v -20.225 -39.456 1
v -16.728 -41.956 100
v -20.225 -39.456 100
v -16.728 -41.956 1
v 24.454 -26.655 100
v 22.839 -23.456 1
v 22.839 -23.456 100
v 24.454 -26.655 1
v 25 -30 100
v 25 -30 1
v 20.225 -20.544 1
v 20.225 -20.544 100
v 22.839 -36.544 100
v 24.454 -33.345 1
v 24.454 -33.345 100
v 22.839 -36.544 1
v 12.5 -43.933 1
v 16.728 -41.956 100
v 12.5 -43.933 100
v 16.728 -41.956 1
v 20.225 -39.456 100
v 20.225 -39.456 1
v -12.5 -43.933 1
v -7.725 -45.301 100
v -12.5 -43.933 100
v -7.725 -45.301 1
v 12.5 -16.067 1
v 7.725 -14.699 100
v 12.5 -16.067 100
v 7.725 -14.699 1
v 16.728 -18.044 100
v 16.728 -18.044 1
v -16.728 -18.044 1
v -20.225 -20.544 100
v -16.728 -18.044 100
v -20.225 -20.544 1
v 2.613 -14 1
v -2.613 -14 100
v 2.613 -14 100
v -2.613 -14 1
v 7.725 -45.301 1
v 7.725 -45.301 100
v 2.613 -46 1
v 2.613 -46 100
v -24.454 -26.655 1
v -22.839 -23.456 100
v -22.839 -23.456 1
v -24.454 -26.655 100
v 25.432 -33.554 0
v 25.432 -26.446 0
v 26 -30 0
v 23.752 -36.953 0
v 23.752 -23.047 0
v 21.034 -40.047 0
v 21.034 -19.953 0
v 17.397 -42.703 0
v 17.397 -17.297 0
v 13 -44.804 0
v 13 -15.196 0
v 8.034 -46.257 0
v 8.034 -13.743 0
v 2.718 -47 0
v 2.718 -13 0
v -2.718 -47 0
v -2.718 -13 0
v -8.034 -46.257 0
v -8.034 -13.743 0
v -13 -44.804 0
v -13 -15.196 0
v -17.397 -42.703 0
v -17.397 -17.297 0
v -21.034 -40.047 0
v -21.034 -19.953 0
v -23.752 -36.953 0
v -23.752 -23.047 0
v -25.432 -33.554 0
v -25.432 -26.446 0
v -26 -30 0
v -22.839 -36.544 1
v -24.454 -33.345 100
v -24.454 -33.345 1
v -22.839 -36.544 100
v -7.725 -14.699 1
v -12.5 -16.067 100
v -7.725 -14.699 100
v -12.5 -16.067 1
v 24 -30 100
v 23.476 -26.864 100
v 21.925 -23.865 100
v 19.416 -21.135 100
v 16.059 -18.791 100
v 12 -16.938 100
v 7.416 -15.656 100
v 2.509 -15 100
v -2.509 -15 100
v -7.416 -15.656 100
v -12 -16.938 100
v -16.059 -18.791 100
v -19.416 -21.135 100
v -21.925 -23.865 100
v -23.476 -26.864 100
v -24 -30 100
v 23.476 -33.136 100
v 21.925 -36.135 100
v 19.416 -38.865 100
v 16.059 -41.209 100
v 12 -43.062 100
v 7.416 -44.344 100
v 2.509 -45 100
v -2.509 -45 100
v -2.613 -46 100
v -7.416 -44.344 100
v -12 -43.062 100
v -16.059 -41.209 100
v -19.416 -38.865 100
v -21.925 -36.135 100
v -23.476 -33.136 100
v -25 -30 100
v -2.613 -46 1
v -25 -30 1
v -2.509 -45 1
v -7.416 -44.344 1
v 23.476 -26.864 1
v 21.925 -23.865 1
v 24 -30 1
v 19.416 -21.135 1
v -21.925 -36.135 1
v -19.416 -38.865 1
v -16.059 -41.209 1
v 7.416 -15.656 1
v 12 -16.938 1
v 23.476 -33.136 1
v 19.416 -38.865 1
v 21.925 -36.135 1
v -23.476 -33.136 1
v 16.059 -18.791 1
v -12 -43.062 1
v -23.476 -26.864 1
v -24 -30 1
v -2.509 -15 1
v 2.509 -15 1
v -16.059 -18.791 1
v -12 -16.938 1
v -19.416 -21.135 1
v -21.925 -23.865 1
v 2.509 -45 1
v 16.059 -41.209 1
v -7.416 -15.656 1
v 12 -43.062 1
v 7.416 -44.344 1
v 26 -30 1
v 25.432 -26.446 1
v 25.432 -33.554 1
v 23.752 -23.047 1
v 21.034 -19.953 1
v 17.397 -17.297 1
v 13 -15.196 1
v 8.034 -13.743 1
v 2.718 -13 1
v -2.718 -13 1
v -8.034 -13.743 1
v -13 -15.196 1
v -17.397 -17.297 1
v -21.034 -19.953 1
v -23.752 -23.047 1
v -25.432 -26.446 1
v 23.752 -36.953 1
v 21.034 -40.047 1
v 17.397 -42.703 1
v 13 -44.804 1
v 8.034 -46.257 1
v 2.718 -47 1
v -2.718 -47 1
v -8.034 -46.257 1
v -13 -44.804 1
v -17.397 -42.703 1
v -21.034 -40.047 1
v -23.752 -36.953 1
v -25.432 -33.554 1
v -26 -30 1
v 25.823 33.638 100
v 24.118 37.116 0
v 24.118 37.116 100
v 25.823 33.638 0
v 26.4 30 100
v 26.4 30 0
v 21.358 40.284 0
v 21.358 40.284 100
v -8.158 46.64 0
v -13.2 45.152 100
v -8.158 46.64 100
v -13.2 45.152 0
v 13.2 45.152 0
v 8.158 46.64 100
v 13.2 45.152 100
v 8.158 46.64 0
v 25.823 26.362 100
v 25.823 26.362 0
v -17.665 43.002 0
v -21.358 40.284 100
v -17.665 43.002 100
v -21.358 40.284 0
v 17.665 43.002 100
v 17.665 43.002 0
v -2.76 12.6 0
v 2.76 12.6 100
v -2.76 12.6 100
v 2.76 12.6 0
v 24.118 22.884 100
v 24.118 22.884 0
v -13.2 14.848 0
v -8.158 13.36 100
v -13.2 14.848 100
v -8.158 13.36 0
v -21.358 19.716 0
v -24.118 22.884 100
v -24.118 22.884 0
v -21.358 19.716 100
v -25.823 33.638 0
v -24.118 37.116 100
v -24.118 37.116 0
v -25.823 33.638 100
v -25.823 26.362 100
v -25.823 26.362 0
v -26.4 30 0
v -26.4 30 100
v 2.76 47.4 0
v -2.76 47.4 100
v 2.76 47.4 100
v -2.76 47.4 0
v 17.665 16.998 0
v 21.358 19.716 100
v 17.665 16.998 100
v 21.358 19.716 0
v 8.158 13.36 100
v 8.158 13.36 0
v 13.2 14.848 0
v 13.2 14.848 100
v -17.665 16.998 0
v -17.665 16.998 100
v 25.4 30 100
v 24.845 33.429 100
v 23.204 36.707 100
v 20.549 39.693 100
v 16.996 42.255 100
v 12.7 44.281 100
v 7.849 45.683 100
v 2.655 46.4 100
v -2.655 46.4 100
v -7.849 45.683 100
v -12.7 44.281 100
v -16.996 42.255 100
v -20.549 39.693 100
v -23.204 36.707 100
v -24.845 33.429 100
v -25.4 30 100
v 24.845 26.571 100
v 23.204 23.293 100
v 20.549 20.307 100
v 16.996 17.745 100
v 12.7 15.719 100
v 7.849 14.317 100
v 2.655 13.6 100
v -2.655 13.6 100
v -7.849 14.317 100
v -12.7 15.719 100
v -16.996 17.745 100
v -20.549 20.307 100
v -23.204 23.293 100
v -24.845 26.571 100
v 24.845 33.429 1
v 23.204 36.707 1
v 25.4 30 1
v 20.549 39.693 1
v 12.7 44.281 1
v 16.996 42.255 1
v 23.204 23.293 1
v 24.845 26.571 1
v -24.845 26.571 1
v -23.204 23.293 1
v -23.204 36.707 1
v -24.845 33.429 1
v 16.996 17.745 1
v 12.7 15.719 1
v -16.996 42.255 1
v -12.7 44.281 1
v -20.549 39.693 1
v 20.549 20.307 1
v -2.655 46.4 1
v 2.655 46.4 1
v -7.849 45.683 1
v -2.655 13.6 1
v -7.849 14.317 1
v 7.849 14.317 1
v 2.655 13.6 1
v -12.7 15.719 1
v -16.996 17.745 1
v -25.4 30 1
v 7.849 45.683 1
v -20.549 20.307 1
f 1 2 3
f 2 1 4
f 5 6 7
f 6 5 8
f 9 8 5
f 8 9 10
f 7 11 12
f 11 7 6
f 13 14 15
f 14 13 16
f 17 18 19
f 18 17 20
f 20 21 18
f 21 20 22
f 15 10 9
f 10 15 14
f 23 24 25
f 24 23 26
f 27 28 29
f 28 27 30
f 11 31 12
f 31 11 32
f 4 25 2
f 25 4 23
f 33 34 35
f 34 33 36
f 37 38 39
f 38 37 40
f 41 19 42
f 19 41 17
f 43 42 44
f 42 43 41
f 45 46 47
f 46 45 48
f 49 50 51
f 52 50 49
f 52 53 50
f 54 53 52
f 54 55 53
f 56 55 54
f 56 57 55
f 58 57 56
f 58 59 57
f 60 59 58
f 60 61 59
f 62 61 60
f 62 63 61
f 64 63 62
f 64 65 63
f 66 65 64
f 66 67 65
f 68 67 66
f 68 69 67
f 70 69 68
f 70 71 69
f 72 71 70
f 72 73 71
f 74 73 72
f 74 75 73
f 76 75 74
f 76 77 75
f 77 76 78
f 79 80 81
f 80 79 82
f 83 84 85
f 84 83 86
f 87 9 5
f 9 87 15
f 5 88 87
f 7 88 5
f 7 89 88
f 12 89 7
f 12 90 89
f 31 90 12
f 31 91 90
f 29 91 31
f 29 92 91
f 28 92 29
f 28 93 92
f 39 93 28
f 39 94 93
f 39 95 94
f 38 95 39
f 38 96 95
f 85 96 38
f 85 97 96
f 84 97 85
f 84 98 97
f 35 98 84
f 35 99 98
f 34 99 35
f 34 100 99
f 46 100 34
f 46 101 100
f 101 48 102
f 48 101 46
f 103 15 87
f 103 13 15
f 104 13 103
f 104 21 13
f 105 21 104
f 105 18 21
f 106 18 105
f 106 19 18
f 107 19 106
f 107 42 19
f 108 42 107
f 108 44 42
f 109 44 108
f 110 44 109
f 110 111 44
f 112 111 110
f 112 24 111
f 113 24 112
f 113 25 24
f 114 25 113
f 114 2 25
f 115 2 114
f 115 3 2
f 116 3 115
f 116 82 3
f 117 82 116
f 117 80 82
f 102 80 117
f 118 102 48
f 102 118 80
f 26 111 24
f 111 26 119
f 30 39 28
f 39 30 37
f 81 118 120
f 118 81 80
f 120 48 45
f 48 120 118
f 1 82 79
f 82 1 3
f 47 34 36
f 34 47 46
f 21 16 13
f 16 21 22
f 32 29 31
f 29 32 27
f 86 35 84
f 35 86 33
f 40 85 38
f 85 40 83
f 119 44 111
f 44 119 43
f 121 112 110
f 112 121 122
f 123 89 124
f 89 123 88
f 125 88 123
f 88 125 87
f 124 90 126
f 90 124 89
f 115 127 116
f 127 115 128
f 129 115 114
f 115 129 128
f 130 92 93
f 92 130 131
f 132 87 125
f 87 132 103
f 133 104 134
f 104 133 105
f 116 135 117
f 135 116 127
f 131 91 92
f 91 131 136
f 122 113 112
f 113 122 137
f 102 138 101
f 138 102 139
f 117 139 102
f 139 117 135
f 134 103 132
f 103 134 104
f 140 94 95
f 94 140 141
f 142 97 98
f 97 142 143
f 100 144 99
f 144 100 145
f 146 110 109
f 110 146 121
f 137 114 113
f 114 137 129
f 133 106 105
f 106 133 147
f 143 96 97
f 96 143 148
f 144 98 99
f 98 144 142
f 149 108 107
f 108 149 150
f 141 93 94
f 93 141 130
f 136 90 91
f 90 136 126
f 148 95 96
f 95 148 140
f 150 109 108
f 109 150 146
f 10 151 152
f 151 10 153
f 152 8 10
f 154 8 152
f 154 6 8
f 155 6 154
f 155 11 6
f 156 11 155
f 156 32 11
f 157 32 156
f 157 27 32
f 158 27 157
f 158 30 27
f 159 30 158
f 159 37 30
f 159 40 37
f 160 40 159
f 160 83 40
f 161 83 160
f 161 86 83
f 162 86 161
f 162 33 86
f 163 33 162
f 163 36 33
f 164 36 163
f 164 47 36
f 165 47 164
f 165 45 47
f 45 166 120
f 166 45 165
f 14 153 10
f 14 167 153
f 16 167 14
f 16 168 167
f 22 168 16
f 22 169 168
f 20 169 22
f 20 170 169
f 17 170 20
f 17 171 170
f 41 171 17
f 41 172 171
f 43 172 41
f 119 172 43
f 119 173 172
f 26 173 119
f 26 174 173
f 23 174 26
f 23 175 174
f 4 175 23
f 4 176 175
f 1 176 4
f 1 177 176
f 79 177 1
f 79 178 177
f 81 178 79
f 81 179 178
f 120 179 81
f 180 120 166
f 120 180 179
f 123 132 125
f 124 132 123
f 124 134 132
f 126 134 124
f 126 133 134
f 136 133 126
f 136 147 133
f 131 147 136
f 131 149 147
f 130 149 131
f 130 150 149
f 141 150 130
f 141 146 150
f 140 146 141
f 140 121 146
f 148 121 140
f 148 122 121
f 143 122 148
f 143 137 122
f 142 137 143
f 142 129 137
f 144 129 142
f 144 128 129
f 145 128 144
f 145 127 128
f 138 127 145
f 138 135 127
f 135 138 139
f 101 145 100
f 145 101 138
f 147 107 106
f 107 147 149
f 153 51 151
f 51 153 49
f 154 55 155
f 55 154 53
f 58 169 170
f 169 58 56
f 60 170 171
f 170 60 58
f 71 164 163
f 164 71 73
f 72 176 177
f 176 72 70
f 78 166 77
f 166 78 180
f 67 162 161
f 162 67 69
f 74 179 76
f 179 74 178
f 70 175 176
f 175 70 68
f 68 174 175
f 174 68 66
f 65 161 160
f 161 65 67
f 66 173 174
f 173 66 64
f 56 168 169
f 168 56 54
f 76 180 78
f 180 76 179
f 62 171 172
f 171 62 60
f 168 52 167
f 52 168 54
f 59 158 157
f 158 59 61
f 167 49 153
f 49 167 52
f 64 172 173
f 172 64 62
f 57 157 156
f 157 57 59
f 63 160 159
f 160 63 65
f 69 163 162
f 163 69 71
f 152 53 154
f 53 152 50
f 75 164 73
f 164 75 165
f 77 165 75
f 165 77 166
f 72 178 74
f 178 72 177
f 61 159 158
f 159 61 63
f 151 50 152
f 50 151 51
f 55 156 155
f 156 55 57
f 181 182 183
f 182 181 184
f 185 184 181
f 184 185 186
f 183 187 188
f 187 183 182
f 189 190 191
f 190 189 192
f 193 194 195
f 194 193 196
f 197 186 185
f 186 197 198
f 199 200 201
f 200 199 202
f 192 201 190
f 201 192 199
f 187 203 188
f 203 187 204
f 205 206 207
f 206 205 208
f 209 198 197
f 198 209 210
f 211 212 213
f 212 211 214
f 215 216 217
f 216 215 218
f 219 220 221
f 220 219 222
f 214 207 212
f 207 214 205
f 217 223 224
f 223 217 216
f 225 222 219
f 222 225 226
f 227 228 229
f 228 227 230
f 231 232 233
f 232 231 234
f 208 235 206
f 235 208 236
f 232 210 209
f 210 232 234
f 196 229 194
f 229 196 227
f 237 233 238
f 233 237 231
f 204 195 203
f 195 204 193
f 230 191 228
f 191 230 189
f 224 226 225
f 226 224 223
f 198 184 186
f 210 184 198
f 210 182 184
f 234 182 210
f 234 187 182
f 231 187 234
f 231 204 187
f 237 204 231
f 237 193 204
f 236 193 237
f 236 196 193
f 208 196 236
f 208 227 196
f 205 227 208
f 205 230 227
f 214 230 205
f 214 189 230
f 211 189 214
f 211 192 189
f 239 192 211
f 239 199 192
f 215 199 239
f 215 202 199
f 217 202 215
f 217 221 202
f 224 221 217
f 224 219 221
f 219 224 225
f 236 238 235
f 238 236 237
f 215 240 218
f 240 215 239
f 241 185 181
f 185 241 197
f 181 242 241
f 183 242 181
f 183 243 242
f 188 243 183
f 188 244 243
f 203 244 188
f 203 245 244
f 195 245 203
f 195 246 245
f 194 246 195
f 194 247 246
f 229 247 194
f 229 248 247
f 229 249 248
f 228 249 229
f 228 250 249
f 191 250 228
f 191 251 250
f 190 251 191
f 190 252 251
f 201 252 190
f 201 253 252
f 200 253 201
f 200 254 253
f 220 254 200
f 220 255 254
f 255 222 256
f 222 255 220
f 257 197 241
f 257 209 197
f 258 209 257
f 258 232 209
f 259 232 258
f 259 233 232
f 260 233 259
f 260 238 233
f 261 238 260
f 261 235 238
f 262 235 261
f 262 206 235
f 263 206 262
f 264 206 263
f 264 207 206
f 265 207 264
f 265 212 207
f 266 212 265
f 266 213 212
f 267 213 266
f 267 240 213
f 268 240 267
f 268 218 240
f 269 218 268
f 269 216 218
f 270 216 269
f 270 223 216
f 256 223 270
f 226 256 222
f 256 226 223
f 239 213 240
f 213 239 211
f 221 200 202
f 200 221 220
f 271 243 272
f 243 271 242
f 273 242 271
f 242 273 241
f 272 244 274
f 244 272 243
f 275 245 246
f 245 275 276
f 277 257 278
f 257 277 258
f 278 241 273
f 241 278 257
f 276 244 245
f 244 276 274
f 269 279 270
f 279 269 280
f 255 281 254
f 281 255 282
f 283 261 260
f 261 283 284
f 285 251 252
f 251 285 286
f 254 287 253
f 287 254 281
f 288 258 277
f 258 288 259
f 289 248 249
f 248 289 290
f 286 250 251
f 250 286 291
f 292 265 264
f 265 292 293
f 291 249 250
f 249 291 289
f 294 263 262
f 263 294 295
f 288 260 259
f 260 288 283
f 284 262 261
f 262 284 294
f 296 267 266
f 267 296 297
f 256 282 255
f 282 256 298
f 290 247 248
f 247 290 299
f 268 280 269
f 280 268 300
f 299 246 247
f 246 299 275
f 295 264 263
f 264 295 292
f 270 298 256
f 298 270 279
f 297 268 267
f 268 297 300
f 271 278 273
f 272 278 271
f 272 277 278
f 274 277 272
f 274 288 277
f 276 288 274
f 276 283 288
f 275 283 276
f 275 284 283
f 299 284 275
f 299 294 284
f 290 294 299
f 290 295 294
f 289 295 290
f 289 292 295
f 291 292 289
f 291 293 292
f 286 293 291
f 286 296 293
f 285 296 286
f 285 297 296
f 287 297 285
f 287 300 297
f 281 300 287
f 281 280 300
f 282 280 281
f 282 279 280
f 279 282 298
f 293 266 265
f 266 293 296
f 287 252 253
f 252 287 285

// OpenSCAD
// Eyeglass Case
// by HarlemSquirrel
// http://www.thingiverse.com/HarlemSquirrel

// *** Variables ***
// *****************

// The gap between the two halves in mm
buffer = 0.4; //[0.1:0.1:0.6]
// The height of each half in mm
inside_height = 100; //[50:150]
// The inside length in mm
inside_length = 50; //[10:60]
// The inside width in mm
inside_width = 30; //[10:60]
// The thickness of the walls
wall_thickness = 1; // [0.1:0.1:1]


// *** Modules ***
// ***************
module half(i_height, i_length, i_width) {
  difference() {
    resize([0,i_width+(wall_thickness*2),0])
    cylinder(h=i_height, d=i_length);
    
    translate([0,0,wall_thickness])
    resize([0,i_width,0])
    cylinder(
      h=i_height+wall_thickness, 
      d=i_length - (wall_thickness*2)
    );
  }
}

module make_halves() {
  //inside_half
  translate([0,-inside_width,0]) {
    half(inside_height, inside_length, inside_width);
    
    // lip
    linear_extrude(wall_thickness)
    resize([0, inside_width+(wall_thickness*4), 0])
    circle(d=inside_length+ (wall_thickness*2));
  }
  

  //outside_half
  translate([0,inside_width,0])
  half(
    inside_height, 
    inside_length + (wall_thickness*2) + buffer*2, 
    inside_width + (wall_thickness*2) + buffer*2
  );
}


make_halves();
//resize([0,40,0]) cylinder(h=100, d=20);
